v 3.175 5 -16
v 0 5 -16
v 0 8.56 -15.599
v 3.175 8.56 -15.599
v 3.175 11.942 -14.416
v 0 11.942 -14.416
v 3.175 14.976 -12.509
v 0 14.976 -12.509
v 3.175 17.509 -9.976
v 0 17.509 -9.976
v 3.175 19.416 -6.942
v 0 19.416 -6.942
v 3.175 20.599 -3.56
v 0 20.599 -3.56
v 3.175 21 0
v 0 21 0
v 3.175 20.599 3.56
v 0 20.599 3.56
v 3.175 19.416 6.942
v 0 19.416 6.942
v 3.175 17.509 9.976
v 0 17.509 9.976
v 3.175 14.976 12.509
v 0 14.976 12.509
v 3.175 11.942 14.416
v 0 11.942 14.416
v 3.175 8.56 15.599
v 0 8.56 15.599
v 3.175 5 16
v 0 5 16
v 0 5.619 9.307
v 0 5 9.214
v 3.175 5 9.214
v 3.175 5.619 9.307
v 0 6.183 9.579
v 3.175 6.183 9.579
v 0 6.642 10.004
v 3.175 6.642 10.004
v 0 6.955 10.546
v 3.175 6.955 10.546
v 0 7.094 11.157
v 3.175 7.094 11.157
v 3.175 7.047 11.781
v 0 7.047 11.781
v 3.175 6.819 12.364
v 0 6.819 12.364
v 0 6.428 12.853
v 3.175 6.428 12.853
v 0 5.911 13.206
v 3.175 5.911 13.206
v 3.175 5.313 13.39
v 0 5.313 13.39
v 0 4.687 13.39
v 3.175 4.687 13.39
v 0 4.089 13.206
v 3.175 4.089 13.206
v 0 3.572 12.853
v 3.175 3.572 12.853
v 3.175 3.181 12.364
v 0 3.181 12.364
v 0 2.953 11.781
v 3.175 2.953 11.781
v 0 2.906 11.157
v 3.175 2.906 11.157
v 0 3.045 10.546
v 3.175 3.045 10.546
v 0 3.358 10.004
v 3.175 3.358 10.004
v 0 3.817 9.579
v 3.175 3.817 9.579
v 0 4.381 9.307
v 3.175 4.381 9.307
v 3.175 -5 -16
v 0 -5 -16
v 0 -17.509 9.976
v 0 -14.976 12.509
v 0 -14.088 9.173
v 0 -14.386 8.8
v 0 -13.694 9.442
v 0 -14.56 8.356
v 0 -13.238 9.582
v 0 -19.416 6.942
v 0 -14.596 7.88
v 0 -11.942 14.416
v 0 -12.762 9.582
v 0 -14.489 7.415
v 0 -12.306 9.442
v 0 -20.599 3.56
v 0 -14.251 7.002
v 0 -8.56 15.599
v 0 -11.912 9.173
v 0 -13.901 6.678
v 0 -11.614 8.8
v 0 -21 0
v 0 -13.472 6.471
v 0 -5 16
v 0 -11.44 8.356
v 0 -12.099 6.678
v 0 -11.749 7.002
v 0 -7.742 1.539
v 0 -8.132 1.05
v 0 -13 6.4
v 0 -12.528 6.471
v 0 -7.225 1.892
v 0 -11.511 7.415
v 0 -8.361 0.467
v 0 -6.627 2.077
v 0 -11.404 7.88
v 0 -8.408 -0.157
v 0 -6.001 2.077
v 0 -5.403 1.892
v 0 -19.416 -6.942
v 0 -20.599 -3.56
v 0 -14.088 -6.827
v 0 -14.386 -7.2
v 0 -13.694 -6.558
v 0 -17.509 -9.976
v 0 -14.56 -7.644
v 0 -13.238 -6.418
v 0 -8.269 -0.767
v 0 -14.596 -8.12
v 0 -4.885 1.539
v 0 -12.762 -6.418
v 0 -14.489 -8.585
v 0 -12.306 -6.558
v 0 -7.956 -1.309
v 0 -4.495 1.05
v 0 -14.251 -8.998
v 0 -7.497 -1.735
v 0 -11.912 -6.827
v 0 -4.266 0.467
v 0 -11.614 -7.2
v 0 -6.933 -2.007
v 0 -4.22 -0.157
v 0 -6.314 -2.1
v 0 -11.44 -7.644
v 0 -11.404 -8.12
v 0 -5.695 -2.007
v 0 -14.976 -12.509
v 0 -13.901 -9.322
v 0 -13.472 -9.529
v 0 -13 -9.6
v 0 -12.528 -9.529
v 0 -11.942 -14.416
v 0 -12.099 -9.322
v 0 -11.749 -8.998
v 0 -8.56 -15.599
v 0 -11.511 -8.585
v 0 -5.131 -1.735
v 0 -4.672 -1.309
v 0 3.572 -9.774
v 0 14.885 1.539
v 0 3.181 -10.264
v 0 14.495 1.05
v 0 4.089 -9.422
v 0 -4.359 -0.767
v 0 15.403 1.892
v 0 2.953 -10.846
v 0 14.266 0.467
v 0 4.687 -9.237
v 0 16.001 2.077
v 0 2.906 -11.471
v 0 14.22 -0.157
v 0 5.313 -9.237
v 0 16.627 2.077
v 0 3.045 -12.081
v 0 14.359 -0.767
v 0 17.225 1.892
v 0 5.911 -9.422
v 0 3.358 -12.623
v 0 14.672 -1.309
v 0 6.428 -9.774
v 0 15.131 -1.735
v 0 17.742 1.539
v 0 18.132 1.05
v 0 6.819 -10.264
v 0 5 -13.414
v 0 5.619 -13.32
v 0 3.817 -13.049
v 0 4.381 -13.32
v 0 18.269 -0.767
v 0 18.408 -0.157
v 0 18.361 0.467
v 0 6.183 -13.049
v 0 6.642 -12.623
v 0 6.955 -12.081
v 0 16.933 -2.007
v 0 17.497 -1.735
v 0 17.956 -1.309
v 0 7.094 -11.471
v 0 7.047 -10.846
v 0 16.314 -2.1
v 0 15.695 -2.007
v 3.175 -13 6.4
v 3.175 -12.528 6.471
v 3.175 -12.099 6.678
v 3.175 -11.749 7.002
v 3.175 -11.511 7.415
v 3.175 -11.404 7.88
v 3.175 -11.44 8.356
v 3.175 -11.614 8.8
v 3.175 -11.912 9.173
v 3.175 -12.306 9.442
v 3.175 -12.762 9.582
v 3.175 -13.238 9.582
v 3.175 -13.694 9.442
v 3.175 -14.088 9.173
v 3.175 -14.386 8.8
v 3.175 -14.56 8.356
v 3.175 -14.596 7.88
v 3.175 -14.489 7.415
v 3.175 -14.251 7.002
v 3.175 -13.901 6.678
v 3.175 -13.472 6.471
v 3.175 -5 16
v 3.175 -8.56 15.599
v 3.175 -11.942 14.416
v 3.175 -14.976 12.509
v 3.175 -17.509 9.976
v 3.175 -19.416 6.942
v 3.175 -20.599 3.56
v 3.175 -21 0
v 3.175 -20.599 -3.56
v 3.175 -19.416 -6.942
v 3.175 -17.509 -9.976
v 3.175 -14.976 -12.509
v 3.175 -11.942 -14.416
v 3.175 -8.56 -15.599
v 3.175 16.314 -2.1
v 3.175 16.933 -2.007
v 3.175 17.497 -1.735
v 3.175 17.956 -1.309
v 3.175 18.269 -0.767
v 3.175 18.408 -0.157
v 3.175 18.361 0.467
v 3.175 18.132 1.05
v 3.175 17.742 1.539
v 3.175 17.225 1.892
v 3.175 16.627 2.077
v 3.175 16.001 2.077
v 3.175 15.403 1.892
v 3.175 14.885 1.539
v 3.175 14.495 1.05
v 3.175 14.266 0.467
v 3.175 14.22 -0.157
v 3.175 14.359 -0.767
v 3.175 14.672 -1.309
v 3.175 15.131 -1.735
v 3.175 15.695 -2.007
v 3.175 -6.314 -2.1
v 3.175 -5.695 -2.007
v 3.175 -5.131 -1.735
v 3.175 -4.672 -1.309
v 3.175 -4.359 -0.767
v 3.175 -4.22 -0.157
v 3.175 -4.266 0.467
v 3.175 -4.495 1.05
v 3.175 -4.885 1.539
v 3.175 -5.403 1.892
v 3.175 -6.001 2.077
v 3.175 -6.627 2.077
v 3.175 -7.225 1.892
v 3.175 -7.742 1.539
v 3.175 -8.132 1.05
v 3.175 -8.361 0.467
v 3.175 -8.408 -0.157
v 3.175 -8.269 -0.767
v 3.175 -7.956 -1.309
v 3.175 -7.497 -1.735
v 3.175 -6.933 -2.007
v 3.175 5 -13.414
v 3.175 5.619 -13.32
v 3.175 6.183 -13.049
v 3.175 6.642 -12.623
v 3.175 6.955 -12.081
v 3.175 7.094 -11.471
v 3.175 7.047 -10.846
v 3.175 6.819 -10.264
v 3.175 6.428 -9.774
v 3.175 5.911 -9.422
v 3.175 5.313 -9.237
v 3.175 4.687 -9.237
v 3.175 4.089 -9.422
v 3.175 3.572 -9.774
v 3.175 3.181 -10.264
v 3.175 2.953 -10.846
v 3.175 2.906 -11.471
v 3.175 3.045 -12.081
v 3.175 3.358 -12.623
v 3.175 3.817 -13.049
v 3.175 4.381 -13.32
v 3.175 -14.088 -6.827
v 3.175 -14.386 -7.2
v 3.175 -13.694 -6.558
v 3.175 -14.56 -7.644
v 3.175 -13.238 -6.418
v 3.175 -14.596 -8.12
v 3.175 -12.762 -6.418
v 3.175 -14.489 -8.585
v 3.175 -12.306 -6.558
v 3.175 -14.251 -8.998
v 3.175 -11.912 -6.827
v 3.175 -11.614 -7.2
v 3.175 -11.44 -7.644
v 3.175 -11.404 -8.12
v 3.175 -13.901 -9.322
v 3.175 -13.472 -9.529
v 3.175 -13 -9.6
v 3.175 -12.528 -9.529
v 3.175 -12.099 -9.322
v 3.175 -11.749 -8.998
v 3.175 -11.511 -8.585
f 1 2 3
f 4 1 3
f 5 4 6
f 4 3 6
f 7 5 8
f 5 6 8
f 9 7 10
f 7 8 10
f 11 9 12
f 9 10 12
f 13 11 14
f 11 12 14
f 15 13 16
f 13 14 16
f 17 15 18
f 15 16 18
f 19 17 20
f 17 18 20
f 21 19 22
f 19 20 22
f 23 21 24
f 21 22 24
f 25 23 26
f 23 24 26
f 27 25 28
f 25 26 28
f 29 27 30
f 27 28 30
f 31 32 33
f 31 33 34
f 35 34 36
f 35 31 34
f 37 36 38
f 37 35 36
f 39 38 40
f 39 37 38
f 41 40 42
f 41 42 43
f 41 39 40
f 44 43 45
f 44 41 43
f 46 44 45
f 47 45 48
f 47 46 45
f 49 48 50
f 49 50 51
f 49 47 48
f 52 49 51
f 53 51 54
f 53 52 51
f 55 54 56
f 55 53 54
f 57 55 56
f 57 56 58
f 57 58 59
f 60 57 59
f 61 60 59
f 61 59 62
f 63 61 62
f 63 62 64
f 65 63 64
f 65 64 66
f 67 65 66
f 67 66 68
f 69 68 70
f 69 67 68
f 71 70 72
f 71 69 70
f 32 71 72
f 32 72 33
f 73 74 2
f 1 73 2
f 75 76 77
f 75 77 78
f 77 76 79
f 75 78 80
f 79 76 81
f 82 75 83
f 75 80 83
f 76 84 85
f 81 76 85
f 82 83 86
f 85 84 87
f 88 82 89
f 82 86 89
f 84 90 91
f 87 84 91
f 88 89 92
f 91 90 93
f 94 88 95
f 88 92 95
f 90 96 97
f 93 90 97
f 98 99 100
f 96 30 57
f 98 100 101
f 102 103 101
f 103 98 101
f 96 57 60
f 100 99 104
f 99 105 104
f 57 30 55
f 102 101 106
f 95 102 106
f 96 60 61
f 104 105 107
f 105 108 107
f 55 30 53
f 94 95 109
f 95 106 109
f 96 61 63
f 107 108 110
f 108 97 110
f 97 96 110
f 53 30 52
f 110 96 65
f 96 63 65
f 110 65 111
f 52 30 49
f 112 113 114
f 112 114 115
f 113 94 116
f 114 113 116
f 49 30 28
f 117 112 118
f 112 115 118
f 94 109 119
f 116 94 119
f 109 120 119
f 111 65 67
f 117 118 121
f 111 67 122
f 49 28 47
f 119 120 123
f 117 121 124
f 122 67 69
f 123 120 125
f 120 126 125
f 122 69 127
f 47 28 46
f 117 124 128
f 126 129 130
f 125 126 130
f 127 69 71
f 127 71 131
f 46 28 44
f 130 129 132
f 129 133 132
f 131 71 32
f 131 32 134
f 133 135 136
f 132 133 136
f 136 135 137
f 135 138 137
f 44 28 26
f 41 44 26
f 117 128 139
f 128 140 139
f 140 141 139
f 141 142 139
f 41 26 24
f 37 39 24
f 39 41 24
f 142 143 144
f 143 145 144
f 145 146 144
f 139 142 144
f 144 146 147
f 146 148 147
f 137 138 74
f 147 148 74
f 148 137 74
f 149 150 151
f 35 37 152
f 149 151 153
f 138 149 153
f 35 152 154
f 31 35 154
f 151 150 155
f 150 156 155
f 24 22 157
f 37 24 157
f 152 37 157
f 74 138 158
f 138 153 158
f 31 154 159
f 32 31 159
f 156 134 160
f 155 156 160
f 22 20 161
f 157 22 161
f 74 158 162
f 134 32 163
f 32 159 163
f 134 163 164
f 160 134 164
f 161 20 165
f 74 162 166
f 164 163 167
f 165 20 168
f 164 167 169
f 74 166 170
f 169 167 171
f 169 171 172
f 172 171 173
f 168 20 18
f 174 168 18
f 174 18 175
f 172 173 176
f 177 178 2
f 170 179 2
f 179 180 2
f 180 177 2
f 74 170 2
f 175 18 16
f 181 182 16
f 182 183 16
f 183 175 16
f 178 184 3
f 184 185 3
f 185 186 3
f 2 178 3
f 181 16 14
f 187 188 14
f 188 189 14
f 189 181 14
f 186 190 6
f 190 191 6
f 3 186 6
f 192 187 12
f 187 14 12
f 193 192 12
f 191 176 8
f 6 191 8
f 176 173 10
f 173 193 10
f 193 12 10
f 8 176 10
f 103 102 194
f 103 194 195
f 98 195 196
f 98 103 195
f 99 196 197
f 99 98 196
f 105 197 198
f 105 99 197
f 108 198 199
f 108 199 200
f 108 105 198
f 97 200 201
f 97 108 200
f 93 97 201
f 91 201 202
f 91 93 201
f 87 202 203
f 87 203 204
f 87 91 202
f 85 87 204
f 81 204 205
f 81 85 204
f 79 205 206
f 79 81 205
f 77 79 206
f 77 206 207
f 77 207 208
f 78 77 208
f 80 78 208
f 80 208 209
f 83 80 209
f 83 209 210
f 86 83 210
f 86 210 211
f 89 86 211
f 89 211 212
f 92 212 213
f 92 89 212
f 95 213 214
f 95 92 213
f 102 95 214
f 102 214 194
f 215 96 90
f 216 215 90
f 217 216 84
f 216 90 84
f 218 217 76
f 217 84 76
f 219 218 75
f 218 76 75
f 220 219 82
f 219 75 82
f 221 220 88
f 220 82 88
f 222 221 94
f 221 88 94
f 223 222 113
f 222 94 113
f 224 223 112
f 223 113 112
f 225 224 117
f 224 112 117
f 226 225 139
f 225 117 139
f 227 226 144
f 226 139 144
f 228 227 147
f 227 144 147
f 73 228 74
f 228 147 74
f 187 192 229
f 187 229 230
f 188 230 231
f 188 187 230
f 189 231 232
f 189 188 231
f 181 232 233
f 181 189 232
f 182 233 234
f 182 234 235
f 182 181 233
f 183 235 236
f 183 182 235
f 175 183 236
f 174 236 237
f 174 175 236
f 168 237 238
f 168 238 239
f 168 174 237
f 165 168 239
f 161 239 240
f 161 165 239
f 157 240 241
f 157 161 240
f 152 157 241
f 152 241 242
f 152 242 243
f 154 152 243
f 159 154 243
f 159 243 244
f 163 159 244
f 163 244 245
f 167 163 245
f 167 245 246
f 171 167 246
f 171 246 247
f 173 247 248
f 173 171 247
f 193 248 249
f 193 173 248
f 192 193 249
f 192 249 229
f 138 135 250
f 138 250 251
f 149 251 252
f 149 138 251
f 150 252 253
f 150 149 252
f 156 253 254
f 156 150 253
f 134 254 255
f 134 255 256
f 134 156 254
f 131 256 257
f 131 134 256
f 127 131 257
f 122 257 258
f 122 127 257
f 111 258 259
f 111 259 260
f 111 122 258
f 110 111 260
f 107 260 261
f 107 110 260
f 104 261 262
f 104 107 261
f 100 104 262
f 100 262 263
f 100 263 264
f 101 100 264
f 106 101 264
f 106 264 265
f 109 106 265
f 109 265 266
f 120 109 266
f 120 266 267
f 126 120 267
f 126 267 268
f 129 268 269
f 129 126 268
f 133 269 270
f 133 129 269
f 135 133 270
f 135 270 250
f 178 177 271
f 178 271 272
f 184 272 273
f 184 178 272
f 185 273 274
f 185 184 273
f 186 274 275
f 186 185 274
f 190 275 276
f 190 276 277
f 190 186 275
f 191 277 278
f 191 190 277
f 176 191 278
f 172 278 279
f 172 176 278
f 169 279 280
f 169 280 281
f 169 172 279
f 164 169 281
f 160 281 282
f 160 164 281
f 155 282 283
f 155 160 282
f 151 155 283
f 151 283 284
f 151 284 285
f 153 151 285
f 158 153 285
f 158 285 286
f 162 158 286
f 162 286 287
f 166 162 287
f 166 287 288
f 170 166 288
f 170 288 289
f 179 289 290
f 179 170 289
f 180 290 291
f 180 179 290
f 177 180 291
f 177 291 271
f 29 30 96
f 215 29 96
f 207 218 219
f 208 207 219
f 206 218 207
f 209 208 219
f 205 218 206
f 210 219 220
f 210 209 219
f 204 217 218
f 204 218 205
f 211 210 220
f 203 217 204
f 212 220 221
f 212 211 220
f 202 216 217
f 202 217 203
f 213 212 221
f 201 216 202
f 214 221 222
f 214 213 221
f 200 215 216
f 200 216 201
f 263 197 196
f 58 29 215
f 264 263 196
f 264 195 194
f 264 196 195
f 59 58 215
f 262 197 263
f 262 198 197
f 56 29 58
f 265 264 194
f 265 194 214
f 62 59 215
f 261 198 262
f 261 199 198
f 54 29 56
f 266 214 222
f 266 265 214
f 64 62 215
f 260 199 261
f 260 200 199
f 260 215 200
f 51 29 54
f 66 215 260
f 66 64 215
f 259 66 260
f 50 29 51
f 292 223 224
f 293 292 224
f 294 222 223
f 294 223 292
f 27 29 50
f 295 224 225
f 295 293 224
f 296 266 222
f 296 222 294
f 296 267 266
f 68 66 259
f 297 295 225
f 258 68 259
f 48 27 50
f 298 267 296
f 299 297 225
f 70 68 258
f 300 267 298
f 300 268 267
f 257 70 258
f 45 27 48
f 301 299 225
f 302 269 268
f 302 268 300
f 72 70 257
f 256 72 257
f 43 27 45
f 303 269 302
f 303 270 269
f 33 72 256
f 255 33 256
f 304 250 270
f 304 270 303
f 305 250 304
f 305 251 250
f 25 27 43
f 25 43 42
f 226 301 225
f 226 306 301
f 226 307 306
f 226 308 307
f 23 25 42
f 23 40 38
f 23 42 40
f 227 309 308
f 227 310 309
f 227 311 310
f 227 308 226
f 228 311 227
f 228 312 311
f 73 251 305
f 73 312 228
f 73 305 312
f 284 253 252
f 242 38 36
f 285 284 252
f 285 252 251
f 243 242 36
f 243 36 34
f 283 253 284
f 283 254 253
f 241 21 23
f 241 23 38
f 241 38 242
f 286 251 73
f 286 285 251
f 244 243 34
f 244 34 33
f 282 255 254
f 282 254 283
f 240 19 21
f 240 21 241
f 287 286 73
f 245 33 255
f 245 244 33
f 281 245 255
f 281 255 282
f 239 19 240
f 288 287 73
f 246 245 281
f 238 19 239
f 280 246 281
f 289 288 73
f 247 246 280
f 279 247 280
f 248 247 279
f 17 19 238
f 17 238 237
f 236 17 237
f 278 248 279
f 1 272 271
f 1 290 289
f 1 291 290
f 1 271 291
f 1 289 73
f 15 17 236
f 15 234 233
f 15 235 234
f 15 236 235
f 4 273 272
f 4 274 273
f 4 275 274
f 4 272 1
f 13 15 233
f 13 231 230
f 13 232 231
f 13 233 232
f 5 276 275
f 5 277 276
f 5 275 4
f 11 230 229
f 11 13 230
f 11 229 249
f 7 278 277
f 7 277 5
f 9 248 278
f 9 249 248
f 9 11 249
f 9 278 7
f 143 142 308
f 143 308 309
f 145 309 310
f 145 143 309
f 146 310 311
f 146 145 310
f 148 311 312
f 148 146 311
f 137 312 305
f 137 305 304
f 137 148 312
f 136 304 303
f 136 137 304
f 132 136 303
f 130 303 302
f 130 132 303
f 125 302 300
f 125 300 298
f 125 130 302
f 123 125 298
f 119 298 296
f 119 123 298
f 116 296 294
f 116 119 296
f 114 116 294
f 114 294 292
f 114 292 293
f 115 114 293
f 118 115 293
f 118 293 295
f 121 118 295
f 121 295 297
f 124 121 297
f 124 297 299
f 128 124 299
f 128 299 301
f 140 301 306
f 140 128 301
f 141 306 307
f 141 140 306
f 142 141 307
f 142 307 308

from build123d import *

# Parameters (mm, degrees)
SKETCH2_R           = 1.6
SKETCH2_R_2         = 2.1
BOSS_EXTRUDE1_DEPTH = 3.175


with BuildPart() as part:
    # Sketch2 → Boss-Extrude1 (new body)
    with BuildSketch(Plane(origin=(0, 0, 0), x_dir=(0, 0, -1), z_dir=(1, 0, 0))):
        with BuildLine():
            Line((-16, 5), (-16, -5))
            ThreePointArc((-16, -5), (0, -21), (16, -5))
            Line((16, -5), (16, 5))
            ThreePointArc((16, 5), (0, 21), (-16, 5))
        make_face()
        with Locations((-8, -13)):
            Circle(SKETCH2_R, mode=Mode.SUBTRACT)
        with Locations((0, -6.313708499)):
            Circle(SKETCH2_R_2, mode=Mode.SUBTRACT)
        with Locations((8, -13)):
            Circle(SKETCH2_R, mode=Mode.SUBTRACT)
        with Locations((-11.313708499, 5)):
            Circle(SKETCH2_R_2, mode=Mode.SUBTRACT)
        with Locations((0, 16.313708499)):
            Circle(SKETCH2_R_2, mode=Mode.SUBTRACT)
        with Locations((11.313708499, 5)):
            Circle(SKETCH2_R_2, mode=Mode.SUBTRACT)
    extrude(amount=BOSS_EXTRUDE1_DEPTH)


solid = part.part
